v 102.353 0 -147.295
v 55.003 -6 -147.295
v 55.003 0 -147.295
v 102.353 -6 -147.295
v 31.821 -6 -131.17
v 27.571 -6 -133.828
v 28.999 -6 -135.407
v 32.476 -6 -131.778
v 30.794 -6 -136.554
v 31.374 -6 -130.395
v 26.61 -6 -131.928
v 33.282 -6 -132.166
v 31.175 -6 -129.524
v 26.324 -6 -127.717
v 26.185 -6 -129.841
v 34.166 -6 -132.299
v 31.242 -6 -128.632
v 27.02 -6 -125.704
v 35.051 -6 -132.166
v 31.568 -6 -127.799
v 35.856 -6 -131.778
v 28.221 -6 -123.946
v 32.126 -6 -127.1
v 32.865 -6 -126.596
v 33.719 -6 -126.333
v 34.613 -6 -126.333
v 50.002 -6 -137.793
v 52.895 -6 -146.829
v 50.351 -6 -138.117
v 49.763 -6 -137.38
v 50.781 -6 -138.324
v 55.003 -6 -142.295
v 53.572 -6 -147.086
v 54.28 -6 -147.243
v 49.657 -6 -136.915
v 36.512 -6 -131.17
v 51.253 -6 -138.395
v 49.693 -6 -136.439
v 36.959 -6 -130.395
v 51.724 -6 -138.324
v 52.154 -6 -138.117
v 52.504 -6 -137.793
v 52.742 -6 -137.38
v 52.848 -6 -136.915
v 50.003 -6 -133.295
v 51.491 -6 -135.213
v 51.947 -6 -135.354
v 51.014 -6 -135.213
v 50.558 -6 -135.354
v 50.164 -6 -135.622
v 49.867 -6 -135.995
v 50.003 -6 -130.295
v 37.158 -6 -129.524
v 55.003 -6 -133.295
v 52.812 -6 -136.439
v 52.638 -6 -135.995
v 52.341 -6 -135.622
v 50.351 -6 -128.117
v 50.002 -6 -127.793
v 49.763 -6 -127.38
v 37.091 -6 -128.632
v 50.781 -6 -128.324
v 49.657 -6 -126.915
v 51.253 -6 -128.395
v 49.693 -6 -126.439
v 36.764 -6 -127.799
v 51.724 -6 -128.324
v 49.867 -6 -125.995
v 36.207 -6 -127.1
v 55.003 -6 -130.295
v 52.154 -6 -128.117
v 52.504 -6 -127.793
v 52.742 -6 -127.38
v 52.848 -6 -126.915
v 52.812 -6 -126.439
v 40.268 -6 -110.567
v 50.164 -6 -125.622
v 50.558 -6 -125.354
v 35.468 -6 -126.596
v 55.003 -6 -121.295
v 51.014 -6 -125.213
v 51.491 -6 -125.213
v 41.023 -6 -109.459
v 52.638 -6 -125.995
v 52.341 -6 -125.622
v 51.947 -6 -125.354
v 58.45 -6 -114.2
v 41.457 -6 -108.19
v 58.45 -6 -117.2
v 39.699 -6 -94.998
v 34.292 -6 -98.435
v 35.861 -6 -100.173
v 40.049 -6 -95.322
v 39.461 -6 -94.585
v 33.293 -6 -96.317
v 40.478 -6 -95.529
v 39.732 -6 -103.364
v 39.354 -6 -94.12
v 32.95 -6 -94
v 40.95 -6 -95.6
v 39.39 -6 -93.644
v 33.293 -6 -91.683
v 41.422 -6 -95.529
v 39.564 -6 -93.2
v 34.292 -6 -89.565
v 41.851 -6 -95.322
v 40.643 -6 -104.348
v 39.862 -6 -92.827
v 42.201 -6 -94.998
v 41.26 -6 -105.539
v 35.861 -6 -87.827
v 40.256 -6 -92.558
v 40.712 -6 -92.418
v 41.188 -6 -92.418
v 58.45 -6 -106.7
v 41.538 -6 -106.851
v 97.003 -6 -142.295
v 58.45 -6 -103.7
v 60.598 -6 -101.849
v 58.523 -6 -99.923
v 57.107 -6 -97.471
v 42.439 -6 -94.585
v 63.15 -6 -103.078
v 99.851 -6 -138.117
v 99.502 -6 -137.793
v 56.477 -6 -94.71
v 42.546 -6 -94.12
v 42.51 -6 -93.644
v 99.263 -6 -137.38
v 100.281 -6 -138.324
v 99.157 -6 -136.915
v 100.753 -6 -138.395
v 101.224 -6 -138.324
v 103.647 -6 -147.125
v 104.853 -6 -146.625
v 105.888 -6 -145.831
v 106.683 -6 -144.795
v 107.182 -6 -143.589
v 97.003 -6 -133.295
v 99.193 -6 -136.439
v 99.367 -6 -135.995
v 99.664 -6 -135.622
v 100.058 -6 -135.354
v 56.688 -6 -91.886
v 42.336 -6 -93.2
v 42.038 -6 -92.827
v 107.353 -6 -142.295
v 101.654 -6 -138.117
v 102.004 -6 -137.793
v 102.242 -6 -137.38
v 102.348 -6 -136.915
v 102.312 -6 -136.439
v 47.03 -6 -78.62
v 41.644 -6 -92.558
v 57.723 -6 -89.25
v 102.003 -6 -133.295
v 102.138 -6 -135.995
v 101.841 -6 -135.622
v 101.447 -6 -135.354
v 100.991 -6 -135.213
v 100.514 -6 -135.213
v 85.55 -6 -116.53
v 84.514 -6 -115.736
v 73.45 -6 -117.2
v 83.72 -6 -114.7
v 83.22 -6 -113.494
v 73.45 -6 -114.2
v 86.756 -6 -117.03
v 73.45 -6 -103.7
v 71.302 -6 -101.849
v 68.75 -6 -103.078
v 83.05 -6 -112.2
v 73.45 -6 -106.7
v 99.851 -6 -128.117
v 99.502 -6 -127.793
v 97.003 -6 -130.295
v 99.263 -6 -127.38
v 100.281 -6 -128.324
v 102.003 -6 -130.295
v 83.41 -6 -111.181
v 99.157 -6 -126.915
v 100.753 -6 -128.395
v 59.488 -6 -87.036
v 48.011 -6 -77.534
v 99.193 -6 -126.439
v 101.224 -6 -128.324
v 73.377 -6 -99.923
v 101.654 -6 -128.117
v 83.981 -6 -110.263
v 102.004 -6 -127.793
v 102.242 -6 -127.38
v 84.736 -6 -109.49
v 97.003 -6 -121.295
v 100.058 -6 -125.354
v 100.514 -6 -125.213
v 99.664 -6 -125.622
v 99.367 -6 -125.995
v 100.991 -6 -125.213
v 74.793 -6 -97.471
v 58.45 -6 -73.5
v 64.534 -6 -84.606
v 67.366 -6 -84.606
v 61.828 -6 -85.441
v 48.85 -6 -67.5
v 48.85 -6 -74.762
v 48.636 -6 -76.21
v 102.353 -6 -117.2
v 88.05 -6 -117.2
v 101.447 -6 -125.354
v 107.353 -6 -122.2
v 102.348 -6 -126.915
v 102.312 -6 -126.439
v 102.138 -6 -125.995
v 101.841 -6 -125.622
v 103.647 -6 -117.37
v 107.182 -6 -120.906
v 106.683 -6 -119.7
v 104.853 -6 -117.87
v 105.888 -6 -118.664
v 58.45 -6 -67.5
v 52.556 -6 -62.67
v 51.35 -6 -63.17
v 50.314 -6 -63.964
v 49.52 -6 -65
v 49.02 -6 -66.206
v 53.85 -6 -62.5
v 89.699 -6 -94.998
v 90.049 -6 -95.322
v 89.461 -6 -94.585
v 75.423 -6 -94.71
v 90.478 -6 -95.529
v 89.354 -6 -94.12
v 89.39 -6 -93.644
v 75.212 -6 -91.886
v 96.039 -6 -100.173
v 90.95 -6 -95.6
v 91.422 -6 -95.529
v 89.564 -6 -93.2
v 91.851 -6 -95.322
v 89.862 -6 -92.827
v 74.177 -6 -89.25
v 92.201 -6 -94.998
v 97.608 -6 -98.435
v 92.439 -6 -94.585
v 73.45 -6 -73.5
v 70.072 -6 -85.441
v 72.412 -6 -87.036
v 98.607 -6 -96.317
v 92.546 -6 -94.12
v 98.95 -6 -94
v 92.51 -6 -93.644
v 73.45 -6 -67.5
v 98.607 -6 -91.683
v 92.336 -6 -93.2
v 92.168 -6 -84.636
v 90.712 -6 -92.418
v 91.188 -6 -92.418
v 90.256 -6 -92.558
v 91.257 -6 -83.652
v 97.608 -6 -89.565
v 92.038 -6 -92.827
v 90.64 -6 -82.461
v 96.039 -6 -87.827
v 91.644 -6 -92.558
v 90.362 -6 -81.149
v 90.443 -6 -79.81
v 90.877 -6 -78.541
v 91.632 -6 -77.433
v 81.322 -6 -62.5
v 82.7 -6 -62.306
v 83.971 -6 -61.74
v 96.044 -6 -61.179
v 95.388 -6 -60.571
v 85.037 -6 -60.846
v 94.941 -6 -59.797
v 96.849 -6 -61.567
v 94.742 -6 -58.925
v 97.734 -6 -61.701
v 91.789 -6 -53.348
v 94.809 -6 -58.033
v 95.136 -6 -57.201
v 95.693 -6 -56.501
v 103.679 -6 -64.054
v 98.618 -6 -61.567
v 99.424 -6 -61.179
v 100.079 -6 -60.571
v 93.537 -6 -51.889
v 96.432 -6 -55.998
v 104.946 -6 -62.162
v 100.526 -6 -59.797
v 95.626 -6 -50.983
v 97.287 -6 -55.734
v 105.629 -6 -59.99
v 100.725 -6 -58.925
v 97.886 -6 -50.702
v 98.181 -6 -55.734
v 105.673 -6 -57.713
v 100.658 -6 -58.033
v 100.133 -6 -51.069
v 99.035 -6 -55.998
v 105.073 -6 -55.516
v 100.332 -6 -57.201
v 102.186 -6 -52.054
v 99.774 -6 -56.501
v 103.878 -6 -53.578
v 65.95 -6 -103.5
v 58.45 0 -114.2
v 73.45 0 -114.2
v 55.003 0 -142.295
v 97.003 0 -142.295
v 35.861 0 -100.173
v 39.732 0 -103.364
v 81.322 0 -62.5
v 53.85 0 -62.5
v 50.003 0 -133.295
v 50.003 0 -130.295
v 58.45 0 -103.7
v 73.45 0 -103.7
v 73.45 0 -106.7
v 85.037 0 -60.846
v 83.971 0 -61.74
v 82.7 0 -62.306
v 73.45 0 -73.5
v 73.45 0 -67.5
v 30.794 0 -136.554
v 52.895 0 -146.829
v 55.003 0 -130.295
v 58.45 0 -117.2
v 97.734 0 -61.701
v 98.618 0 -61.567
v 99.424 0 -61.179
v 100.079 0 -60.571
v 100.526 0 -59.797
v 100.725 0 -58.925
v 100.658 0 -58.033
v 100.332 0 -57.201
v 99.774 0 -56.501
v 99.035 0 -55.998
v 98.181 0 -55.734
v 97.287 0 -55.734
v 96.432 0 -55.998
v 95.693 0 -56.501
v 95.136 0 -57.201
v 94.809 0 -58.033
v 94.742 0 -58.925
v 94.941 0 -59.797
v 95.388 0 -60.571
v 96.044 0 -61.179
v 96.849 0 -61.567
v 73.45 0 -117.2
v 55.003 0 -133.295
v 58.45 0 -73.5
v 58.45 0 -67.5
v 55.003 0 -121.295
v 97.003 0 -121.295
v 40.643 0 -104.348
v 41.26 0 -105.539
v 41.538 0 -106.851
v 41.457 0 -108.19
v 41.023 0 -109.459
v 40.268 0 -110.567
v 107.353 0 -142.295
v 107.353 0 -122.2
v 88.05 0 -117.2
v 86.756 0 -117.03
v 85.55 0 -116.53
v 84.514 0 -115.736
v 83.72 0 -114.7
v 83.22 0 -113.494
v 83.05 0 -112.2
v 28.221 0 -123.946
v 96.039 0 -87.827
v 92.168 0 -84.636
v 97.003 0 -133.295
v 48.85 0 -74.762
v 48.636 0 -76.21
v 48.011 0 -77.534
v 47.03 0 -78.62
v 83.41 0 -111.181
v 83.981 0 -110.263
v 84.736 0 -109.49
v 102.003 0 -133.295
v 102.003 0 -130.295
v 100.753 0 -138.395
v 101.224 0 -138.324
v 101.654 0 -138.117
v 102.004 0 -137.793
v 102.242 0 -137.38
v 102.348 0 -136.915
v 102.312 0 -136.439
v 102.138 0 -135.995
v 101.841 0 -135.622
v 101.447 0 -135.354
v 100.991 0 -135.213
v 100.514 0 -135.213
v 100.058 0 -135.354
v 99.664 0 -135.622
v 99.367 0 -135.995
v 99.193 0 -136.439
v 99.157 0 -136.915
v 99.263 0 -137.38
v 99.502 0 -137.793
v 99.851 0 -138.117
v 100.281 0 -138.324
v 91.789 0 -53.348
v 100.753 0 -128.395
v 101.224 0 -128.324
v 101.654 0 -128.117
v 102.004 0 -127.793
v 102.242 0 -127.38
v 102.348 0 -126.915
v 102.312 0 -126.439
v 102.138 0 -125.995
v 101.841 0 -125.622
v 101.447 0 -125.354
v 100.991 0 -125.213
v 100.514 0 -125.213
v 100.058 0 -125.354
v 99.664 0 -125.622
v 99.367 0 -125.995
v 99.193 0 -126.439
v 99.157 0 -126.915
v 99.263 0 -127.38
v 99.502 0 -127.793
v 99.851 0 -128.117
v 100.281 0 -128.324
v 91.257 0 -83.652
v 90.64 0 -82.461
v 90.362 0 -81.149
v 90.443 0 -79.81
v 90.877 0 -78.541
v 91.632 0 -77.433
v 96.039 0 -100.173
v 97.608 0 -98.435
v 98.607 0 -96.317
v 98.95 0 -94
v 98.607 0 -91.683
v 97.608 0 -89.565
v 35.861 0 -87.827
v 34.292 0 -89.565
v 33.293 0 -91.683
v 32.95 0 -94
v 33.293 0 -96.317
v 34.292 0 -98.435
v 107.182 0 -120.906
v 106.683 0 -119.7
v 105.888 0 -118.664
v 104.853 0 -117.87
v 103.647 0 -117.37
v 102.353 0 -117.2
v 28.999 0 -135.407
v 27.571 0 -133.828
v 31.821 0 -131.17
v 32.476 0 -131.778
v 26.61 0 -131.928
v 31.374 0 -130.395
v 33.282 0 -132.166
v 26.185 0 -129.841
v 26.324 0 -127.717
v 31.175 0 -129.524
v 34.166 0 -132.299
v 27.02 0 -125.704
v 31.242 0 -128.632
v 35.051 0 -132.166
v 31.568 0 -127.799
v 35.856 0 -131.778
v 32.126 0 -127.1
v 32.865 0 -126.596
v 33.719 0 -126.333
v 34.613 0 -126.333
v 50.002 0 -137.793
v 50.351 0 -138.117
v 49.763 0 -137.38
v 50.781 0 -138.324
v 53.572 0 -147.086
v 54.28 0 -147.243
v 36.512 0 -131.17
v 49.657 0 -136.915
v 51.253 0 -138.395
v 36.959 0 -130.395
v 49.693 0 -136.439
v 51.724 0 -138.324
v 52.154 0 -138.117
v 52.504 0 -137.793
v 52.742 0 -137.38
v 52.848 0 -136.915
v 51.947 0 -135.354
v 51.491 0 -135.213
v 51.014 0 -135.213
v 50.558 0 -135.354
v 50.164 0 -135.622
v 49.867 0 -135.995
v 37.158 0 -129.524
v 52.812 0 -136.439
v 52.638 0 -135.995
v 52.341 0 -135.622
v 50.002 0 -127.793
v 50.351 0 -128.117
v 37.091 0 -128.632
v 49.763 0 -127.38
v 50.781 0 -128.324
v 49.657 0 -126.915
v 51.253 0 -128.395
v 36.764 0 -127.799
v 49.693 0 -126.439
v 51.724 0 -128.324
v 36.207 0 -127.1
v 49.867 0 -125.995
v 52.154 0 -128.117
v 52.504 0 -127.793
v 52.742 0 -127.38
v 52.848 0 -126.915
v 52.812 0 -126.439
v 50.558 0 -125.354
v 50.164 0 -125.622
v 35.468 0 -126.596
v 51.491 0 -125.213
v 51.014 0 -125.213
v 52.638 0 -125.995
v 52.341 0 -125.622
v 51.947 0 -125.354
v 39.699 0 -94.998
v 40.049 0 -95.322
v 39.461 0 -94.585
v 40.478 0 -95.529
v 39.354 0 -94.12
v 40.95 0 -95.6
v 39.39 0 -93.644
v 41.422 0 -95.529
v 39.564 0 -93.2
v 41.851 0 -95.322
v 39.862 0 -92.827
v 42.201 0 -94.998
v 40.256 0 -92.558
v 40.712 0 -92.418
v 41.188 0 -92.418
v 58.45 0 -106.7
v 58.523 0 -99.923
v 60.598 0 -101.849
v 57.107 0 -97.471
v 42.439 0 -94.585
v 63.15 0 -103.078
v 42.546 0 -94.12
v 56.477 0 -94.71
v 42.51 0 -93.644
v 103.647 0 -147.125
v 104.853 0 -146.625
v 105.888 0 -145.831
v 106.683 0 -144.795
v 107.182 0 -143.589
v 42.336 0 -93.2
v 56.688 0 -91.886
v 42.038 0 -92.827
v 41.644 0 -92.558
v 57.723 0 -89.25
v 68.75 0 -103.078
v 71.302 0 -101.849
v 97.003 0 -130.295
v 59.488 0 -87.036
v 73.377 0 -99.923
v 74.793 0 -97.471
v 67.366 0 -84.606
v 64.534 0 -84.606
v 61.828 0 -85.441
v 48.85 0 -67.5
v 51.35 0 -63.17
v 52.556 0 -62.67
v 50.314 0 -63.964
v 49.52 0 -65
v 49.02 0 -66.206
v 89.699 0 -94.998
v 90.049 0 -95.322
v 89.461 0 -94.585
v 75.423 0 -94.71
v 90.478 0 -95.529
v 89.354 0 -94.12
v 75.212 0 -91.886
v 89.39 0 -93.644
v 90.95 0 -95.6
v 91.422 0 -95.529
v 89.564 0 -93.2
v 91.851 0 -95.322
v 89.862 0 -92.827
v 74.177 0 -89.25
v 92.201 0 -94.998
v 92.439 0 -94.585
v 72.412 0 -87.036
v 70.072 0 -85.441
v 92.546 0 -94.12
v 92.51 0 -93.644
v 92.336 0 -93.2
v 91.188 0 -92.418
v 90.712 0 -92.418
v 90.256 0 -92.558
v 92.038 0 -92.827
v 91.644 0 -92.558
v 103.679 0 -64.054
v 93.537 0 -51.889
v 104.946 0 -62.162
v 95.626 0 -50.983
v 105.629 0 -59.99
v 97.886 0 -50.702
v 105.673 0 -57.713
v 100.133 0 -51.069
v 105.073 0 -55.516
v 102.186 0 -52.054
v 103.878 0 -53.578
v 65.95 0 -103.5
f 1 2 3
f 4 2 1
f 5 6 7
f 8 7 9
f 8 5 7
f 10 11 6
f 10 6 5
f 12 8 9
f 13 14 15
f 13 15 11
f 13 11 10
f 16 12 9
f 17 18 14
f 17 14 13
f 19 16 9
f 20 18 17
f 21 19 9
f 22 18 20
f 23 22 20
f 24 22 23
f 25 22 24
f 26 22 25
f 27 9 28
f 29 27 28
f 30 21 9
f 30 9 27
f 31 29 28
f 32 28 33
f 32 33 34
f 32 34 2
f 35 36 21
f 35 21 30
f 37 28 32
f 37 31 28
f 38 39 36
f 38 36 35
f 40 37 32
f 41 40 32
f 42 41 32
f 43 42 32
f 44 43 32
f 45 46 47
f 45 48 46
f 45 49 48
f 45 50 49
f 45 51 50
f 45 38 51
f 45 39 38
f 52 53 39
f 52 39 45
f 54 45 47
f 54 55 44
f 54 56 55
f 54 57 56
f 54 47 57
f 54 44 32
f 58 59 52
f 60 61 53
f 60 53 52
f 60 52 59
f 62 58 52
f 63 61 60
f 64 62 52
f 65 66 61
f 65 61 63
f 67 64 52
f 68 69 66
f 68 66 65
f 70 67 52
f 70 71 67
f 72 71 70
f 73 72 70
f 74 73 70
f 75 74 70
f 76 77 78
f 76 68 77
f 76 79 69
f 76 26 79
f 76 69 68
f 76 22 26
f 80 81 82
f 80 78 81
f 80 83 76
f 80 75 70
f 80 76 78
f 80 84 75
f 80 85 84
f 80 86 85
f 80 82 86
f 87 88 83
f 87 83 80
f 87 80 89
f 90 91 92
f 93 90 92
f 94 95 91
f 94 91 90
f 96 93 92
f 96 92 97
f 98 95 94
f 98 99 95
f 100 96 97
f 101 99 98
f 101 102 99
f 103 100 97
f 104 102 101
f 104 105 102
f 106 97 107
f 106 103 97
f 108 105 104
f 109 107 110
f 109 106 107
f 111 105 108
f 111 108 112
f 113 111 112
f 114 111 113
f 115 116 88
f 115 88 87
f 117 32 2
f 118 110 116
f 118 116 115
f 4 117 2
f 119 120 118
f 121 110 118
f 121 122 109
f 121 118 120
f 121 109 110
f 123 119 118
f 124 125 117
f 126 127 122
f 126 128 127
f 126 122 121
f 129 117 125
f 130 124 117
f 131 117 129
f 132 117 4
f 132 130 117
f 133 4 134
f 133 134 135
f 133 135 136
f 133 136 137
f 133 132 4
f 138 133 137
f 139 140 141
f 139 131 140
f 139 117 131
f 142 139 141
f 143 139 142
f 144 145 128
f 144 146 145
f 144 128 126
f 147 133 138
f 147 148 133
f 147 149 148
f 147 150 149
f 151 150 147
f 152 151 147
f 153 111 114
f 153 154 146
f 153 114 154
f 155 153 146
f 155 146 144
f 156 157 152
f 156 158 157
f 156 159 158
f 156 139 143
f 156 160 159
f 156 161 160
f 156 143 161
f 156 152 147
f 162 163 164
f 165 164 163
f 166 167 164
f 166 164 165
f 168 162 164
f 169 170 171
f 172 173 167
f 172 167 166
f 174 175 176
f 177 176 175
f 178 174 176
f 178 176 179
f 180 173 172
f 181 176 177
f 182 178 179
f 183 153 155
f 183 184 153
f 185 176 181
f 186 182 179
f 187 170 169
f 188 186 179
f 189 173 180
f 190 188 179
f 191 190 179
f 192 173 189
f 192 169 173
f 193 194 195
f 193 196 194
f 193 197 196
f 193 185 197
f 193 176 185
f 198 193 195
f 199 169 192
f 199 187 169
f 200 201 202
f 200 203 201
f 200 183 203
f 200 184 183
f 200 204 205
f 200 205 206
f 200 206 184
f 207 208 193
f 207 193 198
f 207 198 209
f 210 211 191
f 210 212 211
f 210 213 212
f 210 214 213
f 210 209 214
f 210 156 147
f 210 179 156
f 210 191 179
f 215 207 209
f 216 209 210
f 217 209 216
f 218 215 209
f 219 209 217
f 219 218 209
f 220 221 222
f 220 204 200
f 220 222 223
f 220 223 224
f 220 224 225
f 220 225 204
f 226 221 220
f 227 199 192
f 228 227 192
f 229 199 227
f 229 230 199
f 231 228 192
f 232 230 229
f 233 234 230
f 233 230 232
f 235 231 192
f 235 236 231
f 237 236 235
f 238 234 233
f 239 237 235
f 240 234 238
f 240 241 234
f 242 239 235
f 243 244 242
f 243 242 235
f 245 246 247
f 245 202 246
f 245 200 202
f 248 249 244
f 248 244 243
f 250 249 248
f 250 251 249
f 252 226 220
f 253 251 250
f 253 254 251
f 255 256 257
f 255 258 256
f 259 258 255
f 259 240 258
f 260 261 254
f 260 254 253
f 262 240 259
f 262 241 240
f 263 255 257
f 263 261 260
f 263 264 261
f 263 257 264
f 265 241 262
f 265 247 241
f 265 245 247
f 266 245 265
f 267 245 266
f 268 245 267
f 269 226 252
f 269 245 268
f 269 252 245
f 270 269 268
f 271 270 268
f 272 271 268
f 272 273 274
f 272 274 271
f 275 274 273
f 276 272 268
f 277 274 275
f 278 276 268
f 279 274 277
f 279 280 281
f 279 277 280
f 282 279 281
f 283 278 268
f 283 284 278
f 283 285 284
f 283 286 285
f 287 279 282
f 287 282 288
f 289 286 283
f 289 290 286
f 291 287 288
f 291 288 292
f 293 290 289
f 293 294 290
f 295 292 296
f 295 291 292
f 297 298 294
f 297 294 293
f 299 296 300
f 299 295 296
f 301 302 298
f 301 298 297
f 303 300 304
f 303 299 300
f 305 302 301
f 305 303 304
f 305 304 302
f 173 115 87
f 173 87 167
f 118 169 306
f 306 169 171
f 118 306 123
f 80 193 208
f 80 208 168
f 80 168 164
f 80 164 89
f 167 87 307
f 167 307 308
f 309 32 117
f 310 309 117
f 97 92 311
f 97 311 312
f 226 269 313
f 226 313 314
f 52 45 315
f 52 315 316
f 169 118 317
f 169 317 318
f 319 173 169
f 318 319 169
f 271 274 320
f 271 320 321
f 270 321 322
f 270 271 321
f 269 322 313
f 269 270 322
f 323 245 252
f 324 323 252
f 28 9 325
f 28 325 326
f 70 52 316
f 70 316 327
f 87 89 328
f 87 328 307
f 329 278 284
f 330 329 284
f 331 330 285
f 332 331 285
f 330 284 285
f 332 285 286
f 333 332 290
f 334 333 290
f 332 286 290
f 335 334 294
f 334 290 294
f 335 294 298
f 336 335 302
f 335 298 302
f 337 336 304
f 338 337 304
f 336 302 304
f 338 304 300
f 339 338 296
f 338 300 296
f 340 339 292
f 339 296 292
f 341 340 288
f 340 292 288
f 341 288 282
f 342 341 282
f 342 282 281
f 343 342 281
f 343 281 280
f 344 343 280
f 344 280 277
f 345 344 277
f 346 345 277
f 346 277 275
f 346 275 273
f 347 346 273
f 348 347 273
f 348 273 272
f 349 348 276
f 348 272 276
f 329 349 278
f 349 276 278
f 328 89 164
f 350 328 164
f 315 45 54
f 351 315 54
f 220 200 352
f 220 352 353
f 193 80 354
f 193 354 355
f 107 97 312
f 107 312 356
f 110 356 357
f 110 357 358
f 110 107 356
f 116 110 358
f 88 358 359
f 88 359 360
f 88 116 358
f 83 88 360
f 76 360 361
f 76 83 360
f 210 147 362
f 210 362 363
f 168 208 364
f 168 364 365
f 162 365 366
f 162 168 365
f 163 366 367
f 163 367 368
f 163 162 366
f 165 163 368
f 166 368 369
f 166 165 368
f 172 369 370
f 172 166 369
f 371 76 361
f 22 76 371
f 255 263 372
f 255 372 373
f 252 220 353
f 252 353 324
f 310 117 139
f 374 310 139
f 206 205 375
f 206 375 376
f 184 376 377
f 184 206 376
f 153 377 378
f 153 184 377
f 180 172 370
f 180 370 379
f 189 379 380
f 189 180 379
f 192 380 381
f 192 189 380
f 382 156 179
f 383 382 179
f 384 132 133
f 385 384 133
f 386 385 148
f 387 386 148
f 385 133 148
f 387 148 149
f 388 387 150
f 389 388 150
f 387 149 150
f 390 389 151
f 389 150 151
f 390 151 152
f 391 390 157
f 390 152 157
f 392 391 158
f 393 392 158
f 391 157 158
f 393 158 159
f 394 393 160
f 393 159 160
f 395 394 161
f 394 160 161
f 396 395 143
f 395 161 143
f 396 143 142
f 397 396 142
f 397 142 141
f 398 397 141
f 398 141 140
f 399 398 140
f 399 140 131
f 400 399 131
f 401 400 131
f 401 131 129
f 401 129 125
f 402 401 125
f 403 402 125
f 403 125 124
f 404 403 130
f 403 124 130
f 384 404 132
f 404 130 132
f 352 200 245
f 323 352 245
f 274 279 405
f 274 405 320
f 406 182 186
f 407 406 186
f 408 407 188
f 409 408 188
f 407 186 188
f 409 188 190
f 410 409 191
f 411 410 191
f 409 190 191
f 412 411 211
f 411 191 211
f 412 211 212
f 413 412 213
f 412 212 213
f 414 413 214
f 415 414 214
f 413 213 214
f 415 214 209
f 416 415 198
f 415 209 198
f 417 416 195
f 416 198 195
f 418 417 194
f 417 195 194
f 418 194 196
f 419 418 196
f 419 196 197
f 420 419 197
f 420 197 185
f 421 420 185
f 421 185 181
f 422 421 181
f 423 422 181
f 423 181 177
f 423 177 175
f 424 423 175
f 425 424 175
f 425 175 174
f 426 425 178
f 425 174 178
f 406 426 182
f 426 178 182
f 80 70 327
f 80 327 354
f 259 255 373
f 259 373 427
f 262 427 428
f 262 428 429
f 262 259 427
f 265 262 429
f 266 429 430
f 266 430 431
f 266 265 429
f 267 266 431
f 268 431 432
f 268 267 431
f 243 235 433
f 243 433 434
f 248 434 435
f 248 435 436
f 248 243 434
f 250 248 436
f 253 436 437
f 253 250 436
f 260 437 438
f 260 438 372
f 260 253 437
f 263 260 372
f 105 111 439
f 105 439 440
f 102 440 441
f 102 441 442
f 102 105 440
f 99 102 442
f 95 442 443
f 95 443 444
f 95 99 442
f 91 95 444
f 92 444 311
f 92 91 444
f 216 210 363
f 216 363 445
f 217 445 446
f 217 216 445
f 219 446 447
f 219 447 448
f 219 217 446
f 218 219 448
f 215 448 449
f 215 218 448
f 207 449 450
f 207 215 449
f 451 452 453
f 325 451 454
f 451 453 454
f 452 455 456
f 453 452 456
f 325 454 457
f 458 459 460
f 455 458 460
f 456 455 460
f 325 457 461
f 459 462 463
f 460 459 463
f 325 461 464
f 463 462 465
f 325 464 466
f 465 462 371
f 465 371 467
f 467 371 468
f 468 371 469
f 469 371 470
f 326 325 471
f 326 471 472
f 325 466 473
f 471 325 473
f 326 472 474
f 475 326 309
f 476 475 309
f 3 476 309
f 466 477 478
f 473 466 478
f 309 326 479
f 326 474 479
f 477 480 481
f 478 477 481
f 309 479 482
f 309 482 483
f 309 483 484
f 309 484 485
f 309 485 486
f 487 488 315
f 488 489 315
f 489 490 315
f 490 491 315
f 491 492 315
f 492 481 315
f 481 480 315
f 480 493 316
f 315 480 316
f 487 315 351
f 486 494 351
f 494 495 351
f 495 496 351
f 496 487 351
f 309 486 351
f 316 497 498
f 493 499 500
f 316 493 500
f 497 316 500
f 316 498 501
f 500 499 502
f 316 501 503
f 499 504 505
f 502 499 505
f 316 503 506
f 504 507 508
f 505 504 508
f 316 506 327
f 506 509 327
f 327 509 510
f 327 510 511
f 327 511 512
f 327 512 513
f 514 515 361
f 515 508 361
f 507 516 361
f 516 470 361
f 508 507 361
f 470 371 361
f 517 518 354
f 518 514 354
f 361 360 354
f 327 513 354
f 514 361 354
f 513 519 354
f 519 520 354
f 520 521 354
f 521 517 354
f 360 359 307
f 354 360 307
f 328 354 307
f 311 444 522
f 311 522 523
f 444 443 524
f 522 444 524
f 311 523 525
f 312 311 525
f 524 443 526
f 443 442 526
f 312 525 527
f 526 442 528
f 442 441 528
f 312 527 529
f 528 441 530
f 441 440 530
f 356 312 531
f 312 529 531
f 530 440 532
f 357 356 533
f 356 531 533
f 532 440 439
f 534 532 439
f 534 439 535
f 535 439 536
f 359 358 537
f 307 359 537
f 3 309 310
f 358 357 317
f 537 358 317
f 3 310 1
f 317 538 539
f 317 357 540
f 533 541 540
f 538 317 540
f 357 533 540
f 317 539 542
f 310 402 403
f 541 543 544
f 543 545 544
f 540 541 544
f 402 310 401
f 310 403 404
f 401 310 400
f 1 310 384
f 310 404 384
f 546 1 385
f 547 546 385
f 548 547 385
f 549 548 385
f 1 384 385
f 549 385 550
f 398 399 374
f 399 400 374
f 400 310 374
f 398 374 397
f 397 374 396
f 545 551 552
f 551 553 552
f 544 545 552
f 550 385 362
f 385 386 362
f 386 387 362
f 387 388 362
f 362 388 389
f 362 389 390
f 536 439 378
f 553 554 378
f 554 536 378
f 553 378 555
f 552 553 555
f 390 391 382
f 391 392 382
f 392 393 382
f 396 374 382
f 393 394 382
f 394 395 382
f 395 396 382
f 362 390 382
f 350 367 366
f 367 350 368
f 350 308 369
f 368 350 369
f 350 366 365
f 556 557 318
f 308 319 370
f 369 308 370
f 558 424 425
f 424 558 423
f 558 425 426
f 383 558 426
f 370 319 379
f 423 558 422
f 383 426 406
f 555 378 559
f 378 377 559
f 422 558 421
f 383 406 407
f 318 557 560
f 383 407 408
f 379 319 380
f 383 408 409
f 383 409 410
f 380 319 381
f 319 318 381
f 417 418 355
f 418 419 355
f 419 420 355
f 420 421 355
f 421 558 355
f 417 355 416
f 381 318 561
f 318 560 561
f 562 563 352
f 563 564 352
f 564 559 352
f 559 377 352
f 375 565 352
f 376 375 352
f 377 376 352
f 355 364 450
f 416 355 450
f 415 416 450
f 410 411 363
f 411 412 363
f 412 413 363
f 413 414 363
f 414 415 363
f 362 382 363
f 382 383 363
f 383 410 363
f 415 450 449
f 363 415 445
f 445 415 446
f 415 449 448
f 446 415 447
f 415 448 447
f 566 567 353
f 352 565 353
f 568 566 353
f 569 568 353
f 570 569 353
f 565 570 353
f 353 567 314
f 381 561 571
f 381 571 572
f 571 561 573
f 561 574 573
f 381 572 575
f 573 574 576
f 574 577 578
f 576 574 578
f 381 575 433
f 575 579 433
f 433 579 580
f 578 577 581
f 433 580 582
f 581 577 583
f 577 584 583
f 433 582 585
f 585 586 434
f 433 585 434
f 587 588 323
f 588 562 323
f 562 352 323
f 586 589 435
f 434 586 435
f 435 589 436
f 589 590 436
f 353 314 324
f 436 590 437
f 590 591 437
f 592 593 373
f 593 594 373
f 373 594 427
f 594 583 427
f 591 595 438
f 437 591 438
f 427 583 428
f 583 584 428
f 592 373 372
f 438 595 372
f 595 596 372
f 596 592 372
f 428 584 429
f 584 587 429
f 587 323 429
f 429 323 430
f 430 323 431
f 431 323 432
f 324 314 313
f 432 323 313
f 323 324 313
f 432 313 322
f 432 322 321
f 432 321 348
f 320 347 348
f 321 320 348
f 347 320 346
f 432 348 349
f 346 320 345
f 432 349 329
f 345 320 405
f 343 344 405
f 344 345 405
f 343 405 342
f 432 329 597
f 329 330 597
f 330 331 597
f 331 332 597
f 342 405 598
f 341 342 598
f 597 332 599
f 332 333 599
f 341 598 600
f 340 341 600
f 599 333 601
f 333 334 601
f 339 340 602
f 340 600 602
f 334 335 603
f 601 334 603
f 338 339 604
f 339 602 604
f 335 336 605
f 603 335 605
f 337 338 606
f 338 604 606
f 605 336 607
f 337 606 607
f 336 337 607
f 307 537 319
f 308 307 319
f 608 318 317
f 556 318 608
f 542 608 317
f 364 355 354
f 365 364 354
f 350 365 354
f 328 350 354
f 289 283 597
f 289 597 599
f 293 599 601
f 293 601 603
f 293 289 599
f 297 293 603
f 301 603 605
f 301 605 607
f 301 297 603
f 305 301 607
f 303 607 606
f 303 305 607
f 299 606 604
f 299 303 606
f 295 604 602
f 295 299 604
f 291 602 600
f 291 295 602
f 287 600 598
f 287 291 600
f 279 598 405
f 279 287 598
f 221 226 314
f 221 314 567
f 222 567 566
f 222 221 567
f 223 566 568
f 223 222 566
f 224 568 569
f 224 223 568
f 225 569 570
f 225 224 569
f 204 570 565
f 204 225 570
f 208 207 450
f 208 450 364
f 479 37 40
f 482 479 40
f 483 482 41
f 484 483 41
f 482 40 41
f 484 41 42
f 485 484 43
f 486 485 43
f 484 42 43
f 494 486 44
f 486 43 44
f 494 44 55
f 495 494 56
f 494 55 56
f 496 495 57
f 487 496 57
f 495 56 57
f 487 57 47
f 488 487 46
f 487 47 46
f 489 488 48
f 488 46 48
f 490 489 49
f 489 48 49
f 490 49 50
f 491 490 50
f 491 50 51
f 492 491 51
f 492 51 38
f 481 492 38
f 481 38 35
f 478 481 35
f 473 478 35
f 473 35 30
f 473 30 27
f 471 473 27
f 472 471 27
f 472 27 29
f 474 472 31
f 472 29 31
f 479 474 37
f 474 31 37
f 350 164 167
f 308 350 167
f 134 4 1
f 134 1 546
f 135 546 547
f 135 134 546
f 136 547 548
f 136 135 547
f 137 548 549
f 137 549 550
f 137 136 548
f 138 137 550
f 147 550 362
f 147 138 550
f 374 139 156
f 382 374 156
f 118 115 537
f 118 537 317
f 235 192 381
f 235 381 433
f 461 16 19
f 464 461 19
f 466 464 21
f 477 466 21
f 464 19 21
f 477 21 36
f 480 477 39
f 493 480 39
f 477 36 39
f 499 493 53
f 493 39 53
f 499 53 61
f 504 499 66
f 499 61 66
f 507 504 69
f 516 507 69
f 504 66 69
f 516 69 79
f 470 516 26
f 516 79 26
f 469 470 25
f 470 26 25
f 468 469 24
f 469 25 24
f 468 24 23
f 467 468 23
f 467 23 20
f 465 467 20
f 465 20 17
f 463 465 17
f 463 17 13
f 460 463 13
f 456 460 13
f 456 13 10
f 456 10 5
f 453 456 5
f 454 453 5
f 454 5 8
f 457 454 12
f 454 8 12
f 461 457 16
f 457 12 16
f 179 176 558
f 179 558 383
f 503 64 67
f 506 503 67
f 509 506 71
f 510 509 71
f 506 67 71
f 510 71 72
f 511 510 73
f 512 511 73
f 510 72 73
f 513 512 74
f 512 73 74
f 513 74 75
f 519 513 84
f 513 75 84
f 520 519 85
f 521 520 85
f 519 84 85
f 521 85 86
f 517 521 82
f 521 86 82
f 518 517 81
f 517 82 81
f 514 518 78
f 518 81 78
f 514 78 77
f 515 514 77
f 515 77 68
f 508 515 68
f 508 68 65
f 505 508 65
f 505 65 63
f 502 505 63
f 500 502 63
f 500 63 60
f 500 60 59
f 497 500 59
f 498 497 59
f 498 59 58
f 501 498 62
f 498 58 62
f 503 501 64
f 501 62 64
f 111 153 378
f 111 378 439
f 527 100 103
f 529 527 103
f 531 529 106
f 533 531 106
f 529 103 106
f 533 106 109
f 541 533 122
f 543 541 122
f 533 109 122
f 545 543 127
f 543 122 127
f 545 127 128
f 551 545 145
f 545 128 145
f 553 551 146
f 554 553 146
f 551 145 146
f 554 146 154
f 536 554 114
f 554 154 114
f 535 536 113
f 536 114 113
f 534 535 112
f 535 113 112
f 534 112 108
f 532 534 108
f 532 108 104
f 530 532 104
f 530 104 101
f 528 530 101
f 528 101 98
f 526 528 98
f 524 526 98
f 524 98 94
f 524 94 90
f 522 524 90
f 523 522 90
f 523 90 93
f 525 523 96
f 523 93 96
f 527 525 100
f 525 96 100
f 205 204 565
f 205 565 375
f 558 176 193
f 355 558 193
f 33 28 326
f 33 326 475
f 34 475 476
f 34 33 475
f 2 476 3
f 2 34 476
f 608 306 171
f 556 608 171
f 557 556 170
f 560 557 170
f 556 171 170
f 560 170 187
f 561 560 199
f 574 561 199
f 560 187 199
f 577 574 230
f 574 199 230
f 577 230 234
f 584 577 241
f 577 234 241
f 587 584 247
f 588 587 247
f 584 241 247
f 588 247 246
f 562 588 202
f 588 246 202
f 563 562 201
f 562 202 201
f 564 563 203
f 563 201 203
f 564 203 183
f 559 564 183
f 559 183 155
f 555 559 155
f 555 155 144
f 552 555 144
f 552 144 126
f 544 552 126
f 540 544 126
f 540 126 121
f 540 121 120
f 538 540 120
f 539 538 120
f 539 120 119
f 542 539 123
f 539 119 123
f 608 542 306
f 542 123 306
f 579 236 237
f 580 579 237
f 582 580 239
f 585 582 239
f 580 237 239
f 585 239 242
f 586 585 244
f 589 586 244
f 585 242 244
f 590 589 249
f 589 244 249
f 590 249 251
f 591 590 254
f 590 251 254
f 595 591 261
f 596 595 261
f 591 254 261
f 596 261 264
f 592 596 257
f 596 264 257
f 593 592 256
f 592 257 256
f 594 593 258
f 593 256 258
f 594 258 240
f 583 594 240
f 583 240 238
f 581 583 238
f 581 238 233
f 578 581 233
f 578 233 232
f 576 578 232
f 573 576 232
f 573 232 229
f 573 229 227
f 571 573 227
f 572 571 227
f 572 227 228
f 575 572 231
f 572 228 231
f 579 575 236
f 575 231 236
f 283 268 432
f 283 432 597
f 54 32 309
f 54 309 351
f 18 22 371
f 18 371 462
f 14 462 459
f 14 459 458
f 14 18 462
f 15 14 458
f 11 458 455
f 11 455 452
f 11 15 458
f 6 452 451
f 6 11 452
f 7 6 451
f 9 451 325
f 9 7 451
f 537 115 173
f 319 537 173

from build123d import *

# Parameters (mm, degrees)
ESBO_O1_R                = 3
ESBO_O1_R_2              = 1.6
ESBO_O1_W                = 15
ESBO_O1_H                = 3
ESBO_O1_W_2              = 42
ESBO_O1_H_2              = 21
ESBO_O1_R_3              = 9.5
ESBO_O1_H_3              = 6
RESSALTO_EXTRUS_O1_DEPTH = 6
FILETE1_R                = 5
ESBO_O2_W                = 15
ESBO_O2_H                = 1.3
ESBO_O2_W_2              = 5
ESBO_O2_H_2              = 3
CORTE_EXTRUS_O1_DEPTH    = 183.363523005
ESBO_O3_W                = 15
ESBO_O3_H                = 1.3
RESSALTO_EXTRUS_O2_DEPTH = 6


with BuildPart() as part:
    # Esboço1 → Ressalto-extrusão1 (new body)
    with BuildSketch(Plane.XZ.offset(6)):
        with BuildLine():
            ThreePointArc((28.221137594, -123.946334359), (26.32780231, -130.898758331), (30.793557575, -136.55366306))
            Line((30.793557575, -136.55366306), (52.89462836, -146.829127406))
            ThreePointArc((52.89462836, -146.829127406), (53.923154275, -147.177291613), (55.00259, -147.2952))
            Line((55.00259, -147.2952), (102.35259, -147.2952))
            ThreePointArc((102.35259, -147.2952), (105.888123906, -145.830733906), (107.35259, -142.2952))
            Line((107.35259, -142.2952), (107.35259, -122.2))
            ThreePointArc((107.35259, -122.2), (105.888123906, -118.664466094), (102.35259, -117.2))
            Line((102.35259, -117.2), (88.05, -117.2))
            ThreePointArc((88.05, -117.2), (84.514466094, -115.735533906), (83.05, -112.2))
            Line((83.05, -112.2), (83.05, -110.8795617))
            Line((83.05, -110.8795617), (96.038503575, -100.173097388))
            ThreePointArc((96.038503575, -100.173097388), (98.95, -94), (96.038503575, -87.826902612))
            Line((96.038503575, -87.826902612), (88.137508625, -81.314087647))
            Line((88.137508625, -81.314087647), (103.678862406, -64.053665641))
            ThreePointArc((103.678862406, -64.053665641), (103.086748653, -52.755462186), (91.788545198, -53.347575939))
            Line((91.788545198, -53.347575939), (85.037246259, -60.845653032))
            ThreePointArc((85.037246259, -60.845653032), (83.355205347, -62.067727288), (81.321522132, -62.5))
            Line((81.321522132, -62.5), (53.85, -62.5))
            ThreePointArc((53.85, -62.5), (50.314466094, -63.964466094), (48.85, -67.5))
            Line((48.85, -67.5), (48.85, -77.1204383))
            Line((48.85, -77.1204383), (35.861496425, -87.826902612))
            ThreePointArc((35.861496425, -87.826902612), (32.95, -94), (35.861496425, -100.173097388))
            Line((35.861496425, -100.173097388), (43.762491375, -106.685912353))
            Line((43.762491375, -106.685912353), (28.221137594, -123.946334359))
        make_face()
        with Locations(Location((34.166296198, -129.29937921, 0), (0, 0, 270))):
            Circle(ESBO_O1_R, mode=Mode.SUBTRACT)
        with Locations(Location((51.25259, -136.7952, 0), (0, 0, 270))):
            Circle(ESBO_O1_R_2, mode=Mode.SUBTRACT)
        with Locations(Location((51.25259, -126.7952, 0), (0, 0, 270))):
            Circle(ESBO_O1_R_2, mode=Mode.SUBTRACT)
        with Locations((65.95, -115.7)):
            Rectangle(ESBO_O1_W, ESBO_O1_H, mode=Mode.SUBTRACT)
        with Locations((65.95, -106.5)):
            Rectangle(ESBO_O1_W, ESBO_O1_H, mode=Mode.SUBTRACT)
        with Locations((76.00259, -131.7952)):
            Rectangle(ESBO_O1_W_2, ESBO_O1_H_2, mode=Mode.SUBTRACT)
        with Locations(Location((100.75259, -136.7952, 0), (0, 0, 270))):
            Circle(ESBO_O1_R_2, mode=Mode.SUBTRACT)
        with Locations(Location((100.75259, -126.7952, 0), (0, 0, 270))):
            Circle(ESBO_O1_R_2, mode=Mode.SUBTRACT)
        with Locations(Location((65.95, -94, 0), (0, 0, 270))):
            Circle(ESBO_O1_R_3, mode=Mode.SUBTRACT)
        with Locations((65.95, -70.5)):
            Rectangle(ESBO_O1_W, ESBO_O1_H_3, mode=Mode.SUBTRACT)
        with Locations(Location((97.733703802, -58.70062079, 0), (0, 0, 270))):
            Circle(ESBO_O1_R, mode=Mode.SUBTRACT)
        with Locations(Location((40.95, -94, 0), (0, 0, 270))):
            Circle(ESBO_O1_R_2, mode=Mode.SUBTRACT)
        with Locations(Location((90.95, -94, 0), (0, 0, 270))):
            Circle(ESBO_O1_R_2, mode=Mode.SUBTRACT)
    extrude(amount=-RESSALTO_EXTRUS_O1_DEPTH)

    # Filete1
    # the kernel refuses this fillet: 5 mm, written as the material it adds along each edge
    with BuildSketch(Plane(origin=(83.05, -6, -110.8795617), x_dir=(0, 0, -1), z_dir=(0, 1, 0))) as filete1_piece_1:
        with BuildLine():
            CenterArc((2.468290902, -4.866460151), FILETE1_R, 103.271787815, 37.229346276)
            Line((-1.389894966, -1.686145417), (-1.467058683, -1.622539122))
            Line((-1.467058683, -1.622539122), (-0.077163717, 0.063606295))
            Line((-0.077163717, 0.063606295), (0, 0.1))
            ThreePointArc((0, 0.1), (0.66021915, 0.1), (1.297481248, 0.097329203))
            Line((1.297481248, 0.097329203), (1.3204383, 0))
        make_face()
    extrude(amount=6)
    with BuildSketch(Plane(origin=(88.137508625, -6, -81.314087647), x_dir=(0.7716371735307594, 0, -0.6360629469049904), z_dir=(0, 1, 0))) as filete1_piece_2:
        with BuildLine():
            CenterArc((FILETE1_R * 1.04463432468, -FILETE1_R), FILETE1_R, 90, 92.501134091)
            Line((FILETE1_R * 0.045586966675, -FILETE1_R * 1.04363916214), (FILETE1_R * 0.025606019515, -FILETE1_R * 1.04451194539))
            Line((FILETE1_R * 0.025606019515, -FILETE1_R * 1.04451194539), (-FILETE1_R * 0.0208926864935, FILETE1_R * 0.02))
            Line((-FILETE1_R * 0.0208926864935, FILETE1_R * 0.02), (FILETE1_R * 1.04463432468, FILETE1_R * 0.02))
            Line((FILETE1_R * 1.04463432468, FILETE1_R * 0.02), (FILETE1_R * 1.04463432468, 0))
        make_face()
    extrude(amount=6)
    with BuildSketch(Plane(origin=(48.85, -6, -77.1204383), x_dir=(0, 0, 1), z_dir=(0, 1, 0))) as filete1_piece_3:
        with BuildLine():
            CenterArc((FILETE1_R * 0.471642717043, -FILETE1_R), FILETE1_R, 90, 50.501134091)
            Line((-FILETE1_R * 0.299994456488, -FILETE1_R * 0.363937053095), (-FILETE1_R * 0.315427199959, -FILETE1_R * 0.351215794157))
            Line((-FILETE1_R * 0.315427199959, -FILETE1_R * 0.351215794157), (-FILETE1_R * 0.00943285434085, FILETE1_R * 0.02))
            Line((-FILETE1_R * 0.00943285434085, FILETE1_R * 0.02), (FILETE1_R * 0.471642717043, FILETE1_R * 0.02))
            Line((FILETE1_R * 0.471642717043, FILETE1_R * 0.02), (FILETE1_R * 0.471642717043, 0))
        make_face()
    extrude(amount=6)
    with BuildSketch(Plane(origin=(43.762491375, -6, -106.685912353), x_dir=(-0.6691306063588565, 0, -0.7431448254773958), z_dir=(0, 1, 0))) as filete1_piece_4:
        with BuildLine():
            CenterArc((FILETE1_R * 1.04463432468, FILETE1_R), FILETE1_R, 177.498865909, 92.501134091)
            Line((FILETE1_R * 0.0455869666753, FILETE1_R * 1.04363916214), (FILETE1_R * 0.0256060195153, FILETE1_R * 1.04451194539))
            Line((FILETE1_R * 0.0256060195153, FILETE1_R * 1.04451194539), (-FILETE1_R * 0.0208926864935, -FILETE1_R * 0.02))
            Line((-FILETE1_R * 0.0208926864935, -FILETE1_R * 0.02), (FILETE1_R * 1.04463432468, -FILETE1_R * 0.02))
            Line((FILETE1_R * 1.04463432468, -FILETE1_R * 0.02), (FILETE1_R * 1.04463432468, 0))
        make_face()
    extrude(amount=6)

    # Esboço2 → Corte-extrusão1 (cut, through all)
    with BuildSketch(Plane.XZ.offset(6)):
        with Locations((65.95, -104.35)):
            Rectangle(ESBO_O2_W, ESBO_O2_H)
        with Locations((52.50259, -131.7952)):
            Rectangle(ESBO_O2_W_2, ESBO_O2_H_2)
        with Locations((99.50259, -131.7952)):
            Rectangle(ESBO_O2_W_2, ESBO_O2_H_2)
    extrude(amount=-CORTE_EXTRUS_O1_DEPTH, mode=Mode.SUBTRACT)

    # Esboço3 → Ressalto-extrusão2 (add)
    with BuildSketch(Plane.XZ.offset(6)):
        with Locations((65.95, -107.35)):
            Rectangle(ESBO_O3_W, ESBO_O3_H)
    extrude(amount=-RESSALTO_EXTRUS_O2_DEPTH)


solid = part.part
